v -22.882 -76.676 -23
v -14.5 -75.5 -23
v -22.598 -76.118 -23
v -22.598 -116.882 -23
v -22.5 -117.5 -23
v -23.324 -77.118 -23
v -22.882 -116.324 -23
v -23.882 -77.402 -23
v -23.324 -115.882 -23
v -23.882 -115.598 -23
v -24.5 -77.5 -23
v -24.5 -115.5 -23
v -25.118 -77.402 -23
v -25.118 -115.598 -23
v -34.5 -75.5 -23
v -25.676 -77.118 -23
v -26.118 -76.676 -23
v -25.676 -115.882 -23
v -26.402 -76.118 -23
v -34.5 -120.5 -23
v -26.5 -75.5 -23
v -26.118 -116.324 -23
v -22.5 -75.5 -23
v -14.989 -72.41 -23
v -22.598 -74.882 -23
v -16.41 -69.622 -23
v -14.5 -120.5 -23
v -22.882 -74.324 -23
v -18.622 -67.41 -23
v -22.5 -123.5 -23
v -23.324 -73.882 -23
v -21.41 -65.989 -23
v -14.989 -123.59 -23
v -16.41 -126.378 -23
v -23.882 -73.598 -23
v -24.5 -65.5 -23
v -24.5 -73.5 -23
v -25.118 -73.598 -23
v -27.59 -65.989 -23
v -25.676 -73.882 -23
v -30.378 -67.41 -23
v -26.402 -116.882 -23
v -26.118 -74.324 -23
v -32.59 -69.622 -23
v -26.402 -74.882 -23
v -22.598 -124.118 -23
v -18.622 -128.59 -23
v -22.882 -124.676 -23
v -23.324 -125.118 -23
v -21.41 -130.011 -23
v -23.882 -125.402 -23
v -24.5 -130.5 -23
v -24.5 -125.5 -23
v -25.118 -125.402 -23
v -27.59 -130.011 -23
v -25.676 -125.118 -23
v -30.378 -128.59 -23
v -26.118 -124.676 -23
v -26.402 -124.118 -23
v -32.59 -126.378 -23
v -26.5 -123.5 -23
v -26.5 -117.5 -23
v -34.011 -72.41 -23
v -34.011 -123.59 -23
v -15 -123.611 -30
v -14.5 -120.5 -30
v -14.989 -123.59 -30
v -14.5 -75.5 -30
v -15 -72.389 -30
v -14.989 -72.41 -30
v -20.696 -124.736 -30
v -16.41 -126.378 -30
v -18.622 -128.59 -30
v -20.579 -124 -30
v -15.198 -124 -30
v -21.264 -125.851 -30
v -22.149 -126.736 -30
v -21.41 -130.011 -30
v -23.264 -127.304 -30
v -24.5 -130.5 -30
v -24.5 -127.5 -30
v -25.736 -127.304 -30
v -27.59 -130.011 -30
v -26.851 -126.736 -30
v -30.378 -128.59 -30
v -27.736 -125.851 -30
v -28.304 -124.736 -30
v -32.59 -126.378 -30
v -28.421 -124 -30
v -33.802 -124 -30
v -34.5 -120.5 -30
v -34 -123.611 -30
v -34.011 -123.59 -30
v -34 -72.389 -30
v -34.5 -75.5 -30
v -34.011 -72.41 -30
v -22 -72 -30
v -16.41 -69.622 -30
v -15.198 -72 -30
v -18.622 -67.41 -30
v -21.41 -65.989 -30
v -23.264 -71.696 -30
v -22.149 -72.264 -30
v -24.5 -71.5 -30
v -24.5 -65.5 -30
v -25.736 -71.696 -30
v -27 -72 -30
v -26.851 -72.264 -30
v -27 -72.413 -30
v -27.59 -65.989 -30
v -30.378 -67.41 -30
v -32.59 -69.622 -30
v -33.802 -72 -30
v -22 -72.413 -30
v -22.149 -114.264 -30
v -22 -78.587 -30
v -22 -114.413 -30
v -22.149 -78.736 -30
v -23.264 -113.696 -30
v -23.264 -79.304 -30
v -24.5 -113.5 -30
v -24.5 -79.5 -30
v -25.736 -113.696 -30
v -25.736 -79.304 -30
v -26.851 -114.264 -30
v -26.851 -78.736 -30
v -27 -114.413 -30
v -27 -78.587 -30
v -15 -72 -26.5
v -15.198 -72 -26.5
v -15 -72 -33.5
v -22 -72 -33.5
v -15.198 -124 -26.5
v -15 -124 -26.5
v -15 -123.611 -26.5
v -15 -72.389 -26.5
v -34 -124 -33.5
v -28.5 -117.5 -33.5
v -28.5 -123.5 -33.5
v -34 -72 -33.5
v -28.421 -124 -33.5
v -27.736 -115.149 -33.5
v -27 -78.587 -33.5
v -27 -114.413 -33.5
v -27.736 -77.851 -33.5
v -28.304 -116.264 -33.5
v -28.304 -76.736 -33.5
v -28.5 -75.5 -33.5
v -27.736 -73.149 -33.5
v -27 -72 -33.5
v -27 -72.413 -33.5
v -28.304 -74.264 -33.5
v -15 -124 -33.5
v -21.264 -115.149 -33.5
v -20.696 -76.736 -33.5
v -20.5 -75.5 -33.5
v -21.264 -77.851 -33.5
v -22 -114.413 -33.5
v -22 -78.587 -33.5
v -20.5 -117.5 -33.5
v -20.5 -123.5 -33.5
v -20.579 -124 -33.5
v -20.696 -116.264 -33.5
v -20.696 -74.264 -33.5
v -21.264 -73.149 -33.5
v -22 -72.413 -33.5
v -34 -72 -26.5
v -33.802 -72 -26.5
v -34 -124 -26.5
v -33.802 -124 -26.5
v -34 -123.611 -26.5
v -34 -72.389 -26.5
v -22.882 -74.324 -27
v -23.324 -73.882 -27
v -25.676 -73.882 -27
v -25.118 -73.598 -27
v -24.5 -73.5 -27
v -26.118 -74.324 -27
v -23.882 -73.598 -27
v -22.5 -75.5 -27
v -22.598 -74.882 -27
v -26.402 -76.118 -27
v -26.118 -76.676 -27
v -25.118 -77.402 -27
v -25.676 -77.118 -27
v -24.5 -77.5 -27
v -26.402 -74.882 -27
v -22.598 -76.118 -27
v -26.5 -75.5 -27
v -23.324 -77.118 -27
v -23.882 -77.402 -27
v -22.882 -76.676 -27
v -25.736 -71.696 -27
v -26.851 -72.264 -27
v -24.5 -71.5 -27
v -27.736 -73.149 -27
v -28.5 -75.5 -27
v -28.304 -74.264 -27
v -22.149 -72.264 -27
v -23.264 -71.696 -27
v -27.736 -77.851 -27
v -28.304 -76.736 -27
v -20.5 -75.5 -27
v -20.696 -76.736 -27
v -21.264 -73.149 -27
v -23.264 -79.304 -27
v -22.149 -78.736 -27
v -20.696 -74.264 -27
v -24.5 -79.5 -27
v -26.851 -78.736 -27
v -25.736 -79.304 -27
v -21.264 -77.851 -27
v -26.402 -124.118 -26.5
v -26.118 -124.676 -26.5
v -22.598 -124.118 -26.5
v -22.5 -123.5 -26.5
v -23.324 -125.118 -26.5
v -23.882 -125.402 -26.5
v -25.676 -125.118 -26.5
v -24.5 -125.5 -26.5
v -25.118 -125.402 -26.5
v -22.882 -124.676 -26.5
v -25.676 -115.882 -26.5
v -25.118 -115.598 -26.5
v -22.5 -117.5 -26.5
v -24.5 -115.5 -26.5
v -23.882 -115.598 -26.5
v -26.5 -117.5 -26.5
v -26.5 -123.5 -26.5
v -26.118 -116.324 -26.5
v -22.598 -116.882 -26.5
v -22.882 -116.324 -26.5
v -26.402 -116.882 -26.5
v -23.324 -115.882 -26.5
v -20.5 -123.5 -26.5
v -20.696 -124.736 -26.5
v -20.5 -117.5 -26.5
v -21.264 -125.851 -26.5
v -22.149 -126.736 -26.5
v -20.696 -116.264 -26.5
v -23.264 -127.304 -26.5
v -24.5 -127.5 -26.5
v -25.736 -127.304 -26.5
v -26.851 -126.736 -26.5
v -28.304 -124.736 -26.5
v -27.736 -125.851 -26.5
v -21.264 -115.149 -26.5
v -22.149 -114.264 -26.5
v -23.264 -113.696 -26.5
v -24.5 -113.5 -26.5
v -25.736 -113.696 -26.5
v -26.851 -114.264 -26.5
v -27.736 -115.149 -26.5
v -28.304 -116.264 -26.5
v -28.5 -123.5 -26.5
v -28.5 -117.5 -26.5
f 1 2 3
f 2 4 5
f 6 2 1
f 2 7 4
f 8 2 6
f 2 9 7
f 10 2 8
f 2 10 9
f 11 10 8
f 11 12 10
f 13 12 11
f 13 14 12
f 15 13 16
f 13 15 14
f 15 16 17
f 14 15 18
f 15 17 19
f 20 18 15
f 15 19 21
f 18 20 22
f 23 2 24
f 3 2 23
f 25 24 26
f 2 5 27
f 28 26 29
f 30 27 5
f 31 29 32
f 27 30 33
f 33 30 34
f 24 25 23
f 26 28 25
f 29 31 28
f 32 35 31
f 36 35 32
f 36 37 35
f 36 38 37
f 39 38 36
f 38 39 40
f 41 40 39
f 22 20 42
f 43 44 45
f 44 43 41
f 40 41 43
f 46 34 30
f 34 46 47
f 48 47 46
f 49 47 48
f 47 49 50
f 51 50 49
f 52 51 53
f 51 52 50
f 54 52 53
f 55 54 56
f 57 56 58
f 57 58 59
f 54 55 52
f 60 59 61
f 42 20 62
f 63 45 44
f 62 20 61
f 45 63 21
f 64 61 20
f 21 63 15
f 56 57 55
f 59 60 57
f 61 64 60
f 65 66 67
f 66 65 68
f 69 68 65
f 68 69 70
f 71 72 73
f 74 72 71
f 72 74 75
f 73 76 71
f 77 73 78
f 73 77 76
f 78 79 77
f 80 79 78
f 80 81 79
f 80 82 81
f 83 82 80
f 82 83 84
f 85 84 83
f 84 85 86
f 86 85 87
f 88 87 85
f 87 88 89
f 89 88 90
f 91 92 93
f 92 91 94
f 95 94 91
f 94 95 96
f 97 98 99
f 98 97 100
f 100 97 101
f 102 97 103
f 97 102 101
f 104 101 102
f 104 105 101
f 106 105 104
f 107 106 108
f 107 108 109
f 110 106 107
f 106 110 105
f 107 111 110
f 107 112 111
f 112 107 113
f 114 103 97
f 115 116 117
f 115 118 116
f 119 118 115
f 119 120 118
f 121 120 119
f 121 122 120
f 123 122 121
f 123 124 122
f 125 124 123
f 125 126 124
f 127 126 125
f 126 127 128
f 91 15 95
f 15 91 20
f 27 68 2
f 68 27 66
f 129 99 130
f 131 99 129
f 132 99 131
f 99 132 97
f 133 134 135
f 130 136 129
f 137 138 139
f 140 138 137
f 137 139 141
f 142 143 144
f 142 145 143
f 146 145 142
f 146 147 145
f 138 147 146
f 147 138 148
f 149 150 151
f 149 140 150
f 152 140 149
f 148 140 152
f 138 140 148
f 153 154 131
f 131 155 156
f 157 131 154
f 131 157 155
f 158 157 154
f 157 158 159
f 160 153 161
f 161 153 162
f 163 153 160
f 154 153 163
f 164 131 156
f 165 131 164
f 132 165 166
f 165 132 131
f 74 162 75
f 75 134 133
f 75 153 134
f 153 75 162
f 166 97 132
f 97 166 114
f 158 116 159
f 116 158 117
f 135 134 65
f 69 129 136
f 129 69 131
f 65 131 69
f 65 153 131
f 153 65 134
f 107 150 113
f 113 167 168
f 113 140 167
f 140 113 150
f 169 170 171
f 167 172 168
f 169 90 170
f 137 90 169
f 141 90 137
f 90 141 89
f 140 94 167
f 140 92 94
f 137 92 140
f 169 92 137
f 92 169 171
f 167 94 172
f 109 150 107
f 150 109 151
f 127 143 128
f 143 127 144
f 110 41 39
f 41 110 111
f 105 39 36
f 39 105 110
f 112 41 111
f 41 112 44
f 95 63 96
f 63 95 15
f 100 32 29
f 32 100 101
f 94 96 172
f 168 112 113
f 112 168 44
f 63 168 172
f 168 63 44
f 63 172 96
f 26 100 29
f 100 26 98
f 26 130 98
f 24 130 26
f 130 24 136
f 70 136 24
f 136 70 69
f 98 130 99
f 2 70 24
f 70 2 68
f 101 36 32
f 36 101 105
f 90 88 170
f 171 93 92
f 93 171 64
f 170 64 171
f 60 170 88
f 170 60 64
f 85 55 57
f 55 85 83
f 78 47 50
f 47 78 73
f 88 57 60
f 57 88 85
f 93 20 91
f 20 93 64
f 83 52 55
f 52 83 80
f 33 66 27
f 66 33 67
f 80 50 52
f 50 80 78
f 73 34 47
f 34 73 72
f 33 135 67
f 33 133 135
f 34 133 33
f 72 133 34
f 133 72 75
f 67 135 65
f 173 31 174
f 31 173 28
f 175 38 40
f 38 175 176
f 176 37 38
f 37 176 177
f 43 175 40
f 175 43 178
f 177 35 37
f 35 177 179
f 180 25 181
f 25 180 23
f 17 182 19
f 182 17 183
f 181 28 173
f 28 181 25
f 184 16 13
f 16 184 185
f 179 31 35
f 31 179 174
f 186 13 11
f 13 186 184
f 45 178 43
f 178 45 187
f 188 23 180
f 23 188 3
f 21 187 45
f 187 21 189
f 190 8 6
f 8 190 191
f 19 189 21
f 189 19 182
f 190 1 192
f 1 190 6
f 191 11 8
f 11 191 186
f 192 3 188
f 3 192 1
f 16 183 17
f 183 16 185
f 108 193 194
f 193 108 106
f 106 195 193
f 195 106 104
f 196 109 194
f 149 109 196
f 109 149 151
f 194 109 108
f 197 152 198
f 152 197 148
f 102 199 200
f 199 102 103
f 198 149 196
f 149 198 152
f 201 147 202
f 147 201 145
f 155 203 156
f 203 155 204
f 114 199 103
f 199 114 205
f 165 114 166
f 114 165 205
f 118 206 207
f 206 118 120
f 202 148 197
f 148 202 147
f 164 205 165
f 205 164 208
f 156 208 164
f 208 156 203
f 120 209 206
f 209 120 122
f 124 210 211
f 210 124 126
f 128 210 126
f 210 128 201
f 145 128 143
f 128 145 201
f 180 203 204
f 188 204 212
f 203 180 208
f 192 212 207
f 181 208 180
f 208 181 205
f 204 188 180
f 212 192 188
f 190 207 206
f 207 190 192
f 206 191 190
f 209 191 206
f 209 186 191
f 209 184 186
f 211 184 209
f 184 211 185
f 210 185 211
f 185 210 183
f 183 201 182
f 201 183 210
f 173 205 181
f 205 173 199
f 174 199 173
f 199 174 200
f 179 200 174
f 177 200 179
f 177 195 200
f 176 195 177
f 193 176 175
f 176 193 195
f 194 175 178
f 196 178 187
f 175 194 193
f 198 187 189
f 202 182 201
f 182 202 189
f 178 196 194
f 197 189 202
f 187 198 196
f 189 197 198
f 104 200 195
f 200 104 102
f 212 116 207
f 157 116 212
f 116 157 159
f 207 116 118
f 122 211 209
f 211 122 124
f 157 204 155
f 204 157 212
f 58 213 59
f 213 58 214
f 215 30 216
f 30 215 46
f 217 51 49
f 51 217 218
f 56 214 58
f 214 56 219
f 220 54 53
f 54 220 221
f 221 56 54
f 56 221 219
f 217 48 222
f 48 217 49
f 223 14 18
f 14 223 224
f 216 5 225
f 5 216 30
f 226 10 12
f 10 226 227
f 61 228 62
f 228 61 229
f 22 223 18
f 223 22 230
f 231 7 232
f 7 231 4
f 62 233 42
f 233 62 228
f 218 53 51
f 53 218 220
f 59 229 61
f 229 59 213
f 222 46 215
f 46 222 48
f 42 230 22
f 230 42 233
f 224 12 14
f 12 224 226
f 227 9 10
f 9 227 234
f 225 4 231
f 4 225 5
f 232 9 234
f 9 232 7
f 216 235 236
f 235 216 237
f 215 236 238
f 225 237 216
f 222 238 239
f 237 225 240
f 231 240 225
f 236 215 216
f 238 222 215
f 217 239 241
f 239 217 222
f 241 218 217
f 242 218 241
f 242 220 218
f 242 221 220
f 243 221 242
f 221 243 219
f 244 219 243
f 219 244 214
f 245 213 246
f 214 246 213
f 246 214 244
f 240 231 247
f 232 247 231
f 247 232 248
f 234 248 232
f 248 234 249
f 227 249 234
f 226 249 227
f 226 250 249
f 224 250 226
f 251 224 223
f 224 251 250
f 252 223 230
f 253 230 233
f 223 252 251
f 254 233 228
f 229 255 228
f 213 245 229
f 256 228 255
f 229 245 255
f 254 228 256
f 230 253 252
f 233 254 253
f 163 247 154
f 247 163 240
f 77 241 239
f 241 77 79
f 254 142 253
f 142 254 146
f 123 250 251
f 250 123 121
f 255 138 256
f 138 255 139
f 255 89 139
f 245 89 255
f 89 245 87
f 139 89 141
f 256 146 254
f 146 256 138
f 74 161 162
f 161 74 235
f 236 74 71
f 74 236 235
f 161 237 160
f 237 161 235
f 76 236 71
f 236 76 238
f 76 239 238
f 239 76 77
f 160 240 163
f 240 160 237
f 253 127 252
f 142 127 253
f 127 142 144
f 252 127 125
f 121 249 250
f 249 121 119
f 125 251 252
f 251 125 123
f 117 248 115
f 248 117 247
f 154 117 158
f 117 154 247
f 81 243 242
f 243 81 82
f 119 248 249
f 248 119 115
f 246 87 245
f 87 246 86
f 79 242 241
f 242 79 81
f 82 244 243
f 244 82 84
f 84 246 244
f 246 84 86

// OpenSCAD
pb_x = 113/2;
pb_y = 215/2;
pb_z = 45/2;

m4ScrewRadius = 2;
m4ScrewHeadRadius=4;
thick=7;

module powerBrick(){
    difference(){
	cube([pb_x*2, pb_y*2, pb_z*2],center=true);
	translate([pb_x-32,pb_y-32,0])cylinder(r=m4ScrewRadius,h=40,$fn=20);
	translate([pb_x-32,-pb_y+32,0])cylinder(r=m4ScrewRadius,h=40,$fn=20);
	translate([-pb_x+32,pb_y-32,0])cylinder(r=m4ScrewRadius,h=40,$fn=20);
	translate([-pb_x+32,-pb_y+32,0])cylinder(r=m4ScrewRadius,h=40,$fn=20);
	translate([0,pb_y-32,pb_z-11])rotate([0,90,0])cylinder(r=m4ScrewRadius,h=140,center=true,$fn=20);
	translate([0,-pb_y+32,pb_z-11])rotate([0,90,0])cylinder(r=m4ScrewRadius,h=140,center=true,$fn=20);
    }
    
}



module mount(length){
    difference(){
	
	union(){
	    cylinder(r=10, h=thick, $fn=20,center=true);
	    translate([-length/2,0,0]){
		cube([length,20,thick],center=true);
		translate([0,-6,-thick/2])cube([length+7,thick,thick],center=true);
		translate([0,6,-thick/2])cube([length+7,thick,thick],center=true);
	    }
	    translate([-length,0,0])cylinder(r=10, h=thick, $fn=20,center=true);
	}

	//m4Screw holes
	cylinder(r=m4ScrewRadius, h=20, center=true, $fn=20);
	translate([0,0,-4])cylinder(r=m4ScrewHeadRadius, h=thick, center=true, $fn=20);
	
	hull(){
	    translate([-length-3,0,0])cylinder(r=m4ScrewRadius, h=20, center=true, $fn=20);
	    translate([-length+3,0,0])cylinder(r=m4ScrewRadius, h=20, center=true, $fn=20);
	}

	hull(){
	    translate([-length-3,0,-thick/2])cylinder(r=m4ScrewHeadRadius, h=thick, center=true, $fn=20);
	    translate([-length+3,0,-thick/2])cylinder(r=m4ScrewHeadRadius, h=thick, center=true, $fn=20);
	}
    }
}

//translate([-pb_x+32,pb_y-32,-pb_z-4])rotate([0,0,-30])mount(68);
translate([-pb_x+32,-pb_y+32,-pb_z-4]) rotate([0,0,90]) mount(45);

//translate([pb_x-32,pb_y-32,-pb_z-4])rotate([0,0,-150])mount(68);
//translate([pb_x-32,-pb_y+32,-pb_z-4]) rotate([0,0,90]) mount(45);


%color("silver")rotate([0,180,0])powerBrick();
